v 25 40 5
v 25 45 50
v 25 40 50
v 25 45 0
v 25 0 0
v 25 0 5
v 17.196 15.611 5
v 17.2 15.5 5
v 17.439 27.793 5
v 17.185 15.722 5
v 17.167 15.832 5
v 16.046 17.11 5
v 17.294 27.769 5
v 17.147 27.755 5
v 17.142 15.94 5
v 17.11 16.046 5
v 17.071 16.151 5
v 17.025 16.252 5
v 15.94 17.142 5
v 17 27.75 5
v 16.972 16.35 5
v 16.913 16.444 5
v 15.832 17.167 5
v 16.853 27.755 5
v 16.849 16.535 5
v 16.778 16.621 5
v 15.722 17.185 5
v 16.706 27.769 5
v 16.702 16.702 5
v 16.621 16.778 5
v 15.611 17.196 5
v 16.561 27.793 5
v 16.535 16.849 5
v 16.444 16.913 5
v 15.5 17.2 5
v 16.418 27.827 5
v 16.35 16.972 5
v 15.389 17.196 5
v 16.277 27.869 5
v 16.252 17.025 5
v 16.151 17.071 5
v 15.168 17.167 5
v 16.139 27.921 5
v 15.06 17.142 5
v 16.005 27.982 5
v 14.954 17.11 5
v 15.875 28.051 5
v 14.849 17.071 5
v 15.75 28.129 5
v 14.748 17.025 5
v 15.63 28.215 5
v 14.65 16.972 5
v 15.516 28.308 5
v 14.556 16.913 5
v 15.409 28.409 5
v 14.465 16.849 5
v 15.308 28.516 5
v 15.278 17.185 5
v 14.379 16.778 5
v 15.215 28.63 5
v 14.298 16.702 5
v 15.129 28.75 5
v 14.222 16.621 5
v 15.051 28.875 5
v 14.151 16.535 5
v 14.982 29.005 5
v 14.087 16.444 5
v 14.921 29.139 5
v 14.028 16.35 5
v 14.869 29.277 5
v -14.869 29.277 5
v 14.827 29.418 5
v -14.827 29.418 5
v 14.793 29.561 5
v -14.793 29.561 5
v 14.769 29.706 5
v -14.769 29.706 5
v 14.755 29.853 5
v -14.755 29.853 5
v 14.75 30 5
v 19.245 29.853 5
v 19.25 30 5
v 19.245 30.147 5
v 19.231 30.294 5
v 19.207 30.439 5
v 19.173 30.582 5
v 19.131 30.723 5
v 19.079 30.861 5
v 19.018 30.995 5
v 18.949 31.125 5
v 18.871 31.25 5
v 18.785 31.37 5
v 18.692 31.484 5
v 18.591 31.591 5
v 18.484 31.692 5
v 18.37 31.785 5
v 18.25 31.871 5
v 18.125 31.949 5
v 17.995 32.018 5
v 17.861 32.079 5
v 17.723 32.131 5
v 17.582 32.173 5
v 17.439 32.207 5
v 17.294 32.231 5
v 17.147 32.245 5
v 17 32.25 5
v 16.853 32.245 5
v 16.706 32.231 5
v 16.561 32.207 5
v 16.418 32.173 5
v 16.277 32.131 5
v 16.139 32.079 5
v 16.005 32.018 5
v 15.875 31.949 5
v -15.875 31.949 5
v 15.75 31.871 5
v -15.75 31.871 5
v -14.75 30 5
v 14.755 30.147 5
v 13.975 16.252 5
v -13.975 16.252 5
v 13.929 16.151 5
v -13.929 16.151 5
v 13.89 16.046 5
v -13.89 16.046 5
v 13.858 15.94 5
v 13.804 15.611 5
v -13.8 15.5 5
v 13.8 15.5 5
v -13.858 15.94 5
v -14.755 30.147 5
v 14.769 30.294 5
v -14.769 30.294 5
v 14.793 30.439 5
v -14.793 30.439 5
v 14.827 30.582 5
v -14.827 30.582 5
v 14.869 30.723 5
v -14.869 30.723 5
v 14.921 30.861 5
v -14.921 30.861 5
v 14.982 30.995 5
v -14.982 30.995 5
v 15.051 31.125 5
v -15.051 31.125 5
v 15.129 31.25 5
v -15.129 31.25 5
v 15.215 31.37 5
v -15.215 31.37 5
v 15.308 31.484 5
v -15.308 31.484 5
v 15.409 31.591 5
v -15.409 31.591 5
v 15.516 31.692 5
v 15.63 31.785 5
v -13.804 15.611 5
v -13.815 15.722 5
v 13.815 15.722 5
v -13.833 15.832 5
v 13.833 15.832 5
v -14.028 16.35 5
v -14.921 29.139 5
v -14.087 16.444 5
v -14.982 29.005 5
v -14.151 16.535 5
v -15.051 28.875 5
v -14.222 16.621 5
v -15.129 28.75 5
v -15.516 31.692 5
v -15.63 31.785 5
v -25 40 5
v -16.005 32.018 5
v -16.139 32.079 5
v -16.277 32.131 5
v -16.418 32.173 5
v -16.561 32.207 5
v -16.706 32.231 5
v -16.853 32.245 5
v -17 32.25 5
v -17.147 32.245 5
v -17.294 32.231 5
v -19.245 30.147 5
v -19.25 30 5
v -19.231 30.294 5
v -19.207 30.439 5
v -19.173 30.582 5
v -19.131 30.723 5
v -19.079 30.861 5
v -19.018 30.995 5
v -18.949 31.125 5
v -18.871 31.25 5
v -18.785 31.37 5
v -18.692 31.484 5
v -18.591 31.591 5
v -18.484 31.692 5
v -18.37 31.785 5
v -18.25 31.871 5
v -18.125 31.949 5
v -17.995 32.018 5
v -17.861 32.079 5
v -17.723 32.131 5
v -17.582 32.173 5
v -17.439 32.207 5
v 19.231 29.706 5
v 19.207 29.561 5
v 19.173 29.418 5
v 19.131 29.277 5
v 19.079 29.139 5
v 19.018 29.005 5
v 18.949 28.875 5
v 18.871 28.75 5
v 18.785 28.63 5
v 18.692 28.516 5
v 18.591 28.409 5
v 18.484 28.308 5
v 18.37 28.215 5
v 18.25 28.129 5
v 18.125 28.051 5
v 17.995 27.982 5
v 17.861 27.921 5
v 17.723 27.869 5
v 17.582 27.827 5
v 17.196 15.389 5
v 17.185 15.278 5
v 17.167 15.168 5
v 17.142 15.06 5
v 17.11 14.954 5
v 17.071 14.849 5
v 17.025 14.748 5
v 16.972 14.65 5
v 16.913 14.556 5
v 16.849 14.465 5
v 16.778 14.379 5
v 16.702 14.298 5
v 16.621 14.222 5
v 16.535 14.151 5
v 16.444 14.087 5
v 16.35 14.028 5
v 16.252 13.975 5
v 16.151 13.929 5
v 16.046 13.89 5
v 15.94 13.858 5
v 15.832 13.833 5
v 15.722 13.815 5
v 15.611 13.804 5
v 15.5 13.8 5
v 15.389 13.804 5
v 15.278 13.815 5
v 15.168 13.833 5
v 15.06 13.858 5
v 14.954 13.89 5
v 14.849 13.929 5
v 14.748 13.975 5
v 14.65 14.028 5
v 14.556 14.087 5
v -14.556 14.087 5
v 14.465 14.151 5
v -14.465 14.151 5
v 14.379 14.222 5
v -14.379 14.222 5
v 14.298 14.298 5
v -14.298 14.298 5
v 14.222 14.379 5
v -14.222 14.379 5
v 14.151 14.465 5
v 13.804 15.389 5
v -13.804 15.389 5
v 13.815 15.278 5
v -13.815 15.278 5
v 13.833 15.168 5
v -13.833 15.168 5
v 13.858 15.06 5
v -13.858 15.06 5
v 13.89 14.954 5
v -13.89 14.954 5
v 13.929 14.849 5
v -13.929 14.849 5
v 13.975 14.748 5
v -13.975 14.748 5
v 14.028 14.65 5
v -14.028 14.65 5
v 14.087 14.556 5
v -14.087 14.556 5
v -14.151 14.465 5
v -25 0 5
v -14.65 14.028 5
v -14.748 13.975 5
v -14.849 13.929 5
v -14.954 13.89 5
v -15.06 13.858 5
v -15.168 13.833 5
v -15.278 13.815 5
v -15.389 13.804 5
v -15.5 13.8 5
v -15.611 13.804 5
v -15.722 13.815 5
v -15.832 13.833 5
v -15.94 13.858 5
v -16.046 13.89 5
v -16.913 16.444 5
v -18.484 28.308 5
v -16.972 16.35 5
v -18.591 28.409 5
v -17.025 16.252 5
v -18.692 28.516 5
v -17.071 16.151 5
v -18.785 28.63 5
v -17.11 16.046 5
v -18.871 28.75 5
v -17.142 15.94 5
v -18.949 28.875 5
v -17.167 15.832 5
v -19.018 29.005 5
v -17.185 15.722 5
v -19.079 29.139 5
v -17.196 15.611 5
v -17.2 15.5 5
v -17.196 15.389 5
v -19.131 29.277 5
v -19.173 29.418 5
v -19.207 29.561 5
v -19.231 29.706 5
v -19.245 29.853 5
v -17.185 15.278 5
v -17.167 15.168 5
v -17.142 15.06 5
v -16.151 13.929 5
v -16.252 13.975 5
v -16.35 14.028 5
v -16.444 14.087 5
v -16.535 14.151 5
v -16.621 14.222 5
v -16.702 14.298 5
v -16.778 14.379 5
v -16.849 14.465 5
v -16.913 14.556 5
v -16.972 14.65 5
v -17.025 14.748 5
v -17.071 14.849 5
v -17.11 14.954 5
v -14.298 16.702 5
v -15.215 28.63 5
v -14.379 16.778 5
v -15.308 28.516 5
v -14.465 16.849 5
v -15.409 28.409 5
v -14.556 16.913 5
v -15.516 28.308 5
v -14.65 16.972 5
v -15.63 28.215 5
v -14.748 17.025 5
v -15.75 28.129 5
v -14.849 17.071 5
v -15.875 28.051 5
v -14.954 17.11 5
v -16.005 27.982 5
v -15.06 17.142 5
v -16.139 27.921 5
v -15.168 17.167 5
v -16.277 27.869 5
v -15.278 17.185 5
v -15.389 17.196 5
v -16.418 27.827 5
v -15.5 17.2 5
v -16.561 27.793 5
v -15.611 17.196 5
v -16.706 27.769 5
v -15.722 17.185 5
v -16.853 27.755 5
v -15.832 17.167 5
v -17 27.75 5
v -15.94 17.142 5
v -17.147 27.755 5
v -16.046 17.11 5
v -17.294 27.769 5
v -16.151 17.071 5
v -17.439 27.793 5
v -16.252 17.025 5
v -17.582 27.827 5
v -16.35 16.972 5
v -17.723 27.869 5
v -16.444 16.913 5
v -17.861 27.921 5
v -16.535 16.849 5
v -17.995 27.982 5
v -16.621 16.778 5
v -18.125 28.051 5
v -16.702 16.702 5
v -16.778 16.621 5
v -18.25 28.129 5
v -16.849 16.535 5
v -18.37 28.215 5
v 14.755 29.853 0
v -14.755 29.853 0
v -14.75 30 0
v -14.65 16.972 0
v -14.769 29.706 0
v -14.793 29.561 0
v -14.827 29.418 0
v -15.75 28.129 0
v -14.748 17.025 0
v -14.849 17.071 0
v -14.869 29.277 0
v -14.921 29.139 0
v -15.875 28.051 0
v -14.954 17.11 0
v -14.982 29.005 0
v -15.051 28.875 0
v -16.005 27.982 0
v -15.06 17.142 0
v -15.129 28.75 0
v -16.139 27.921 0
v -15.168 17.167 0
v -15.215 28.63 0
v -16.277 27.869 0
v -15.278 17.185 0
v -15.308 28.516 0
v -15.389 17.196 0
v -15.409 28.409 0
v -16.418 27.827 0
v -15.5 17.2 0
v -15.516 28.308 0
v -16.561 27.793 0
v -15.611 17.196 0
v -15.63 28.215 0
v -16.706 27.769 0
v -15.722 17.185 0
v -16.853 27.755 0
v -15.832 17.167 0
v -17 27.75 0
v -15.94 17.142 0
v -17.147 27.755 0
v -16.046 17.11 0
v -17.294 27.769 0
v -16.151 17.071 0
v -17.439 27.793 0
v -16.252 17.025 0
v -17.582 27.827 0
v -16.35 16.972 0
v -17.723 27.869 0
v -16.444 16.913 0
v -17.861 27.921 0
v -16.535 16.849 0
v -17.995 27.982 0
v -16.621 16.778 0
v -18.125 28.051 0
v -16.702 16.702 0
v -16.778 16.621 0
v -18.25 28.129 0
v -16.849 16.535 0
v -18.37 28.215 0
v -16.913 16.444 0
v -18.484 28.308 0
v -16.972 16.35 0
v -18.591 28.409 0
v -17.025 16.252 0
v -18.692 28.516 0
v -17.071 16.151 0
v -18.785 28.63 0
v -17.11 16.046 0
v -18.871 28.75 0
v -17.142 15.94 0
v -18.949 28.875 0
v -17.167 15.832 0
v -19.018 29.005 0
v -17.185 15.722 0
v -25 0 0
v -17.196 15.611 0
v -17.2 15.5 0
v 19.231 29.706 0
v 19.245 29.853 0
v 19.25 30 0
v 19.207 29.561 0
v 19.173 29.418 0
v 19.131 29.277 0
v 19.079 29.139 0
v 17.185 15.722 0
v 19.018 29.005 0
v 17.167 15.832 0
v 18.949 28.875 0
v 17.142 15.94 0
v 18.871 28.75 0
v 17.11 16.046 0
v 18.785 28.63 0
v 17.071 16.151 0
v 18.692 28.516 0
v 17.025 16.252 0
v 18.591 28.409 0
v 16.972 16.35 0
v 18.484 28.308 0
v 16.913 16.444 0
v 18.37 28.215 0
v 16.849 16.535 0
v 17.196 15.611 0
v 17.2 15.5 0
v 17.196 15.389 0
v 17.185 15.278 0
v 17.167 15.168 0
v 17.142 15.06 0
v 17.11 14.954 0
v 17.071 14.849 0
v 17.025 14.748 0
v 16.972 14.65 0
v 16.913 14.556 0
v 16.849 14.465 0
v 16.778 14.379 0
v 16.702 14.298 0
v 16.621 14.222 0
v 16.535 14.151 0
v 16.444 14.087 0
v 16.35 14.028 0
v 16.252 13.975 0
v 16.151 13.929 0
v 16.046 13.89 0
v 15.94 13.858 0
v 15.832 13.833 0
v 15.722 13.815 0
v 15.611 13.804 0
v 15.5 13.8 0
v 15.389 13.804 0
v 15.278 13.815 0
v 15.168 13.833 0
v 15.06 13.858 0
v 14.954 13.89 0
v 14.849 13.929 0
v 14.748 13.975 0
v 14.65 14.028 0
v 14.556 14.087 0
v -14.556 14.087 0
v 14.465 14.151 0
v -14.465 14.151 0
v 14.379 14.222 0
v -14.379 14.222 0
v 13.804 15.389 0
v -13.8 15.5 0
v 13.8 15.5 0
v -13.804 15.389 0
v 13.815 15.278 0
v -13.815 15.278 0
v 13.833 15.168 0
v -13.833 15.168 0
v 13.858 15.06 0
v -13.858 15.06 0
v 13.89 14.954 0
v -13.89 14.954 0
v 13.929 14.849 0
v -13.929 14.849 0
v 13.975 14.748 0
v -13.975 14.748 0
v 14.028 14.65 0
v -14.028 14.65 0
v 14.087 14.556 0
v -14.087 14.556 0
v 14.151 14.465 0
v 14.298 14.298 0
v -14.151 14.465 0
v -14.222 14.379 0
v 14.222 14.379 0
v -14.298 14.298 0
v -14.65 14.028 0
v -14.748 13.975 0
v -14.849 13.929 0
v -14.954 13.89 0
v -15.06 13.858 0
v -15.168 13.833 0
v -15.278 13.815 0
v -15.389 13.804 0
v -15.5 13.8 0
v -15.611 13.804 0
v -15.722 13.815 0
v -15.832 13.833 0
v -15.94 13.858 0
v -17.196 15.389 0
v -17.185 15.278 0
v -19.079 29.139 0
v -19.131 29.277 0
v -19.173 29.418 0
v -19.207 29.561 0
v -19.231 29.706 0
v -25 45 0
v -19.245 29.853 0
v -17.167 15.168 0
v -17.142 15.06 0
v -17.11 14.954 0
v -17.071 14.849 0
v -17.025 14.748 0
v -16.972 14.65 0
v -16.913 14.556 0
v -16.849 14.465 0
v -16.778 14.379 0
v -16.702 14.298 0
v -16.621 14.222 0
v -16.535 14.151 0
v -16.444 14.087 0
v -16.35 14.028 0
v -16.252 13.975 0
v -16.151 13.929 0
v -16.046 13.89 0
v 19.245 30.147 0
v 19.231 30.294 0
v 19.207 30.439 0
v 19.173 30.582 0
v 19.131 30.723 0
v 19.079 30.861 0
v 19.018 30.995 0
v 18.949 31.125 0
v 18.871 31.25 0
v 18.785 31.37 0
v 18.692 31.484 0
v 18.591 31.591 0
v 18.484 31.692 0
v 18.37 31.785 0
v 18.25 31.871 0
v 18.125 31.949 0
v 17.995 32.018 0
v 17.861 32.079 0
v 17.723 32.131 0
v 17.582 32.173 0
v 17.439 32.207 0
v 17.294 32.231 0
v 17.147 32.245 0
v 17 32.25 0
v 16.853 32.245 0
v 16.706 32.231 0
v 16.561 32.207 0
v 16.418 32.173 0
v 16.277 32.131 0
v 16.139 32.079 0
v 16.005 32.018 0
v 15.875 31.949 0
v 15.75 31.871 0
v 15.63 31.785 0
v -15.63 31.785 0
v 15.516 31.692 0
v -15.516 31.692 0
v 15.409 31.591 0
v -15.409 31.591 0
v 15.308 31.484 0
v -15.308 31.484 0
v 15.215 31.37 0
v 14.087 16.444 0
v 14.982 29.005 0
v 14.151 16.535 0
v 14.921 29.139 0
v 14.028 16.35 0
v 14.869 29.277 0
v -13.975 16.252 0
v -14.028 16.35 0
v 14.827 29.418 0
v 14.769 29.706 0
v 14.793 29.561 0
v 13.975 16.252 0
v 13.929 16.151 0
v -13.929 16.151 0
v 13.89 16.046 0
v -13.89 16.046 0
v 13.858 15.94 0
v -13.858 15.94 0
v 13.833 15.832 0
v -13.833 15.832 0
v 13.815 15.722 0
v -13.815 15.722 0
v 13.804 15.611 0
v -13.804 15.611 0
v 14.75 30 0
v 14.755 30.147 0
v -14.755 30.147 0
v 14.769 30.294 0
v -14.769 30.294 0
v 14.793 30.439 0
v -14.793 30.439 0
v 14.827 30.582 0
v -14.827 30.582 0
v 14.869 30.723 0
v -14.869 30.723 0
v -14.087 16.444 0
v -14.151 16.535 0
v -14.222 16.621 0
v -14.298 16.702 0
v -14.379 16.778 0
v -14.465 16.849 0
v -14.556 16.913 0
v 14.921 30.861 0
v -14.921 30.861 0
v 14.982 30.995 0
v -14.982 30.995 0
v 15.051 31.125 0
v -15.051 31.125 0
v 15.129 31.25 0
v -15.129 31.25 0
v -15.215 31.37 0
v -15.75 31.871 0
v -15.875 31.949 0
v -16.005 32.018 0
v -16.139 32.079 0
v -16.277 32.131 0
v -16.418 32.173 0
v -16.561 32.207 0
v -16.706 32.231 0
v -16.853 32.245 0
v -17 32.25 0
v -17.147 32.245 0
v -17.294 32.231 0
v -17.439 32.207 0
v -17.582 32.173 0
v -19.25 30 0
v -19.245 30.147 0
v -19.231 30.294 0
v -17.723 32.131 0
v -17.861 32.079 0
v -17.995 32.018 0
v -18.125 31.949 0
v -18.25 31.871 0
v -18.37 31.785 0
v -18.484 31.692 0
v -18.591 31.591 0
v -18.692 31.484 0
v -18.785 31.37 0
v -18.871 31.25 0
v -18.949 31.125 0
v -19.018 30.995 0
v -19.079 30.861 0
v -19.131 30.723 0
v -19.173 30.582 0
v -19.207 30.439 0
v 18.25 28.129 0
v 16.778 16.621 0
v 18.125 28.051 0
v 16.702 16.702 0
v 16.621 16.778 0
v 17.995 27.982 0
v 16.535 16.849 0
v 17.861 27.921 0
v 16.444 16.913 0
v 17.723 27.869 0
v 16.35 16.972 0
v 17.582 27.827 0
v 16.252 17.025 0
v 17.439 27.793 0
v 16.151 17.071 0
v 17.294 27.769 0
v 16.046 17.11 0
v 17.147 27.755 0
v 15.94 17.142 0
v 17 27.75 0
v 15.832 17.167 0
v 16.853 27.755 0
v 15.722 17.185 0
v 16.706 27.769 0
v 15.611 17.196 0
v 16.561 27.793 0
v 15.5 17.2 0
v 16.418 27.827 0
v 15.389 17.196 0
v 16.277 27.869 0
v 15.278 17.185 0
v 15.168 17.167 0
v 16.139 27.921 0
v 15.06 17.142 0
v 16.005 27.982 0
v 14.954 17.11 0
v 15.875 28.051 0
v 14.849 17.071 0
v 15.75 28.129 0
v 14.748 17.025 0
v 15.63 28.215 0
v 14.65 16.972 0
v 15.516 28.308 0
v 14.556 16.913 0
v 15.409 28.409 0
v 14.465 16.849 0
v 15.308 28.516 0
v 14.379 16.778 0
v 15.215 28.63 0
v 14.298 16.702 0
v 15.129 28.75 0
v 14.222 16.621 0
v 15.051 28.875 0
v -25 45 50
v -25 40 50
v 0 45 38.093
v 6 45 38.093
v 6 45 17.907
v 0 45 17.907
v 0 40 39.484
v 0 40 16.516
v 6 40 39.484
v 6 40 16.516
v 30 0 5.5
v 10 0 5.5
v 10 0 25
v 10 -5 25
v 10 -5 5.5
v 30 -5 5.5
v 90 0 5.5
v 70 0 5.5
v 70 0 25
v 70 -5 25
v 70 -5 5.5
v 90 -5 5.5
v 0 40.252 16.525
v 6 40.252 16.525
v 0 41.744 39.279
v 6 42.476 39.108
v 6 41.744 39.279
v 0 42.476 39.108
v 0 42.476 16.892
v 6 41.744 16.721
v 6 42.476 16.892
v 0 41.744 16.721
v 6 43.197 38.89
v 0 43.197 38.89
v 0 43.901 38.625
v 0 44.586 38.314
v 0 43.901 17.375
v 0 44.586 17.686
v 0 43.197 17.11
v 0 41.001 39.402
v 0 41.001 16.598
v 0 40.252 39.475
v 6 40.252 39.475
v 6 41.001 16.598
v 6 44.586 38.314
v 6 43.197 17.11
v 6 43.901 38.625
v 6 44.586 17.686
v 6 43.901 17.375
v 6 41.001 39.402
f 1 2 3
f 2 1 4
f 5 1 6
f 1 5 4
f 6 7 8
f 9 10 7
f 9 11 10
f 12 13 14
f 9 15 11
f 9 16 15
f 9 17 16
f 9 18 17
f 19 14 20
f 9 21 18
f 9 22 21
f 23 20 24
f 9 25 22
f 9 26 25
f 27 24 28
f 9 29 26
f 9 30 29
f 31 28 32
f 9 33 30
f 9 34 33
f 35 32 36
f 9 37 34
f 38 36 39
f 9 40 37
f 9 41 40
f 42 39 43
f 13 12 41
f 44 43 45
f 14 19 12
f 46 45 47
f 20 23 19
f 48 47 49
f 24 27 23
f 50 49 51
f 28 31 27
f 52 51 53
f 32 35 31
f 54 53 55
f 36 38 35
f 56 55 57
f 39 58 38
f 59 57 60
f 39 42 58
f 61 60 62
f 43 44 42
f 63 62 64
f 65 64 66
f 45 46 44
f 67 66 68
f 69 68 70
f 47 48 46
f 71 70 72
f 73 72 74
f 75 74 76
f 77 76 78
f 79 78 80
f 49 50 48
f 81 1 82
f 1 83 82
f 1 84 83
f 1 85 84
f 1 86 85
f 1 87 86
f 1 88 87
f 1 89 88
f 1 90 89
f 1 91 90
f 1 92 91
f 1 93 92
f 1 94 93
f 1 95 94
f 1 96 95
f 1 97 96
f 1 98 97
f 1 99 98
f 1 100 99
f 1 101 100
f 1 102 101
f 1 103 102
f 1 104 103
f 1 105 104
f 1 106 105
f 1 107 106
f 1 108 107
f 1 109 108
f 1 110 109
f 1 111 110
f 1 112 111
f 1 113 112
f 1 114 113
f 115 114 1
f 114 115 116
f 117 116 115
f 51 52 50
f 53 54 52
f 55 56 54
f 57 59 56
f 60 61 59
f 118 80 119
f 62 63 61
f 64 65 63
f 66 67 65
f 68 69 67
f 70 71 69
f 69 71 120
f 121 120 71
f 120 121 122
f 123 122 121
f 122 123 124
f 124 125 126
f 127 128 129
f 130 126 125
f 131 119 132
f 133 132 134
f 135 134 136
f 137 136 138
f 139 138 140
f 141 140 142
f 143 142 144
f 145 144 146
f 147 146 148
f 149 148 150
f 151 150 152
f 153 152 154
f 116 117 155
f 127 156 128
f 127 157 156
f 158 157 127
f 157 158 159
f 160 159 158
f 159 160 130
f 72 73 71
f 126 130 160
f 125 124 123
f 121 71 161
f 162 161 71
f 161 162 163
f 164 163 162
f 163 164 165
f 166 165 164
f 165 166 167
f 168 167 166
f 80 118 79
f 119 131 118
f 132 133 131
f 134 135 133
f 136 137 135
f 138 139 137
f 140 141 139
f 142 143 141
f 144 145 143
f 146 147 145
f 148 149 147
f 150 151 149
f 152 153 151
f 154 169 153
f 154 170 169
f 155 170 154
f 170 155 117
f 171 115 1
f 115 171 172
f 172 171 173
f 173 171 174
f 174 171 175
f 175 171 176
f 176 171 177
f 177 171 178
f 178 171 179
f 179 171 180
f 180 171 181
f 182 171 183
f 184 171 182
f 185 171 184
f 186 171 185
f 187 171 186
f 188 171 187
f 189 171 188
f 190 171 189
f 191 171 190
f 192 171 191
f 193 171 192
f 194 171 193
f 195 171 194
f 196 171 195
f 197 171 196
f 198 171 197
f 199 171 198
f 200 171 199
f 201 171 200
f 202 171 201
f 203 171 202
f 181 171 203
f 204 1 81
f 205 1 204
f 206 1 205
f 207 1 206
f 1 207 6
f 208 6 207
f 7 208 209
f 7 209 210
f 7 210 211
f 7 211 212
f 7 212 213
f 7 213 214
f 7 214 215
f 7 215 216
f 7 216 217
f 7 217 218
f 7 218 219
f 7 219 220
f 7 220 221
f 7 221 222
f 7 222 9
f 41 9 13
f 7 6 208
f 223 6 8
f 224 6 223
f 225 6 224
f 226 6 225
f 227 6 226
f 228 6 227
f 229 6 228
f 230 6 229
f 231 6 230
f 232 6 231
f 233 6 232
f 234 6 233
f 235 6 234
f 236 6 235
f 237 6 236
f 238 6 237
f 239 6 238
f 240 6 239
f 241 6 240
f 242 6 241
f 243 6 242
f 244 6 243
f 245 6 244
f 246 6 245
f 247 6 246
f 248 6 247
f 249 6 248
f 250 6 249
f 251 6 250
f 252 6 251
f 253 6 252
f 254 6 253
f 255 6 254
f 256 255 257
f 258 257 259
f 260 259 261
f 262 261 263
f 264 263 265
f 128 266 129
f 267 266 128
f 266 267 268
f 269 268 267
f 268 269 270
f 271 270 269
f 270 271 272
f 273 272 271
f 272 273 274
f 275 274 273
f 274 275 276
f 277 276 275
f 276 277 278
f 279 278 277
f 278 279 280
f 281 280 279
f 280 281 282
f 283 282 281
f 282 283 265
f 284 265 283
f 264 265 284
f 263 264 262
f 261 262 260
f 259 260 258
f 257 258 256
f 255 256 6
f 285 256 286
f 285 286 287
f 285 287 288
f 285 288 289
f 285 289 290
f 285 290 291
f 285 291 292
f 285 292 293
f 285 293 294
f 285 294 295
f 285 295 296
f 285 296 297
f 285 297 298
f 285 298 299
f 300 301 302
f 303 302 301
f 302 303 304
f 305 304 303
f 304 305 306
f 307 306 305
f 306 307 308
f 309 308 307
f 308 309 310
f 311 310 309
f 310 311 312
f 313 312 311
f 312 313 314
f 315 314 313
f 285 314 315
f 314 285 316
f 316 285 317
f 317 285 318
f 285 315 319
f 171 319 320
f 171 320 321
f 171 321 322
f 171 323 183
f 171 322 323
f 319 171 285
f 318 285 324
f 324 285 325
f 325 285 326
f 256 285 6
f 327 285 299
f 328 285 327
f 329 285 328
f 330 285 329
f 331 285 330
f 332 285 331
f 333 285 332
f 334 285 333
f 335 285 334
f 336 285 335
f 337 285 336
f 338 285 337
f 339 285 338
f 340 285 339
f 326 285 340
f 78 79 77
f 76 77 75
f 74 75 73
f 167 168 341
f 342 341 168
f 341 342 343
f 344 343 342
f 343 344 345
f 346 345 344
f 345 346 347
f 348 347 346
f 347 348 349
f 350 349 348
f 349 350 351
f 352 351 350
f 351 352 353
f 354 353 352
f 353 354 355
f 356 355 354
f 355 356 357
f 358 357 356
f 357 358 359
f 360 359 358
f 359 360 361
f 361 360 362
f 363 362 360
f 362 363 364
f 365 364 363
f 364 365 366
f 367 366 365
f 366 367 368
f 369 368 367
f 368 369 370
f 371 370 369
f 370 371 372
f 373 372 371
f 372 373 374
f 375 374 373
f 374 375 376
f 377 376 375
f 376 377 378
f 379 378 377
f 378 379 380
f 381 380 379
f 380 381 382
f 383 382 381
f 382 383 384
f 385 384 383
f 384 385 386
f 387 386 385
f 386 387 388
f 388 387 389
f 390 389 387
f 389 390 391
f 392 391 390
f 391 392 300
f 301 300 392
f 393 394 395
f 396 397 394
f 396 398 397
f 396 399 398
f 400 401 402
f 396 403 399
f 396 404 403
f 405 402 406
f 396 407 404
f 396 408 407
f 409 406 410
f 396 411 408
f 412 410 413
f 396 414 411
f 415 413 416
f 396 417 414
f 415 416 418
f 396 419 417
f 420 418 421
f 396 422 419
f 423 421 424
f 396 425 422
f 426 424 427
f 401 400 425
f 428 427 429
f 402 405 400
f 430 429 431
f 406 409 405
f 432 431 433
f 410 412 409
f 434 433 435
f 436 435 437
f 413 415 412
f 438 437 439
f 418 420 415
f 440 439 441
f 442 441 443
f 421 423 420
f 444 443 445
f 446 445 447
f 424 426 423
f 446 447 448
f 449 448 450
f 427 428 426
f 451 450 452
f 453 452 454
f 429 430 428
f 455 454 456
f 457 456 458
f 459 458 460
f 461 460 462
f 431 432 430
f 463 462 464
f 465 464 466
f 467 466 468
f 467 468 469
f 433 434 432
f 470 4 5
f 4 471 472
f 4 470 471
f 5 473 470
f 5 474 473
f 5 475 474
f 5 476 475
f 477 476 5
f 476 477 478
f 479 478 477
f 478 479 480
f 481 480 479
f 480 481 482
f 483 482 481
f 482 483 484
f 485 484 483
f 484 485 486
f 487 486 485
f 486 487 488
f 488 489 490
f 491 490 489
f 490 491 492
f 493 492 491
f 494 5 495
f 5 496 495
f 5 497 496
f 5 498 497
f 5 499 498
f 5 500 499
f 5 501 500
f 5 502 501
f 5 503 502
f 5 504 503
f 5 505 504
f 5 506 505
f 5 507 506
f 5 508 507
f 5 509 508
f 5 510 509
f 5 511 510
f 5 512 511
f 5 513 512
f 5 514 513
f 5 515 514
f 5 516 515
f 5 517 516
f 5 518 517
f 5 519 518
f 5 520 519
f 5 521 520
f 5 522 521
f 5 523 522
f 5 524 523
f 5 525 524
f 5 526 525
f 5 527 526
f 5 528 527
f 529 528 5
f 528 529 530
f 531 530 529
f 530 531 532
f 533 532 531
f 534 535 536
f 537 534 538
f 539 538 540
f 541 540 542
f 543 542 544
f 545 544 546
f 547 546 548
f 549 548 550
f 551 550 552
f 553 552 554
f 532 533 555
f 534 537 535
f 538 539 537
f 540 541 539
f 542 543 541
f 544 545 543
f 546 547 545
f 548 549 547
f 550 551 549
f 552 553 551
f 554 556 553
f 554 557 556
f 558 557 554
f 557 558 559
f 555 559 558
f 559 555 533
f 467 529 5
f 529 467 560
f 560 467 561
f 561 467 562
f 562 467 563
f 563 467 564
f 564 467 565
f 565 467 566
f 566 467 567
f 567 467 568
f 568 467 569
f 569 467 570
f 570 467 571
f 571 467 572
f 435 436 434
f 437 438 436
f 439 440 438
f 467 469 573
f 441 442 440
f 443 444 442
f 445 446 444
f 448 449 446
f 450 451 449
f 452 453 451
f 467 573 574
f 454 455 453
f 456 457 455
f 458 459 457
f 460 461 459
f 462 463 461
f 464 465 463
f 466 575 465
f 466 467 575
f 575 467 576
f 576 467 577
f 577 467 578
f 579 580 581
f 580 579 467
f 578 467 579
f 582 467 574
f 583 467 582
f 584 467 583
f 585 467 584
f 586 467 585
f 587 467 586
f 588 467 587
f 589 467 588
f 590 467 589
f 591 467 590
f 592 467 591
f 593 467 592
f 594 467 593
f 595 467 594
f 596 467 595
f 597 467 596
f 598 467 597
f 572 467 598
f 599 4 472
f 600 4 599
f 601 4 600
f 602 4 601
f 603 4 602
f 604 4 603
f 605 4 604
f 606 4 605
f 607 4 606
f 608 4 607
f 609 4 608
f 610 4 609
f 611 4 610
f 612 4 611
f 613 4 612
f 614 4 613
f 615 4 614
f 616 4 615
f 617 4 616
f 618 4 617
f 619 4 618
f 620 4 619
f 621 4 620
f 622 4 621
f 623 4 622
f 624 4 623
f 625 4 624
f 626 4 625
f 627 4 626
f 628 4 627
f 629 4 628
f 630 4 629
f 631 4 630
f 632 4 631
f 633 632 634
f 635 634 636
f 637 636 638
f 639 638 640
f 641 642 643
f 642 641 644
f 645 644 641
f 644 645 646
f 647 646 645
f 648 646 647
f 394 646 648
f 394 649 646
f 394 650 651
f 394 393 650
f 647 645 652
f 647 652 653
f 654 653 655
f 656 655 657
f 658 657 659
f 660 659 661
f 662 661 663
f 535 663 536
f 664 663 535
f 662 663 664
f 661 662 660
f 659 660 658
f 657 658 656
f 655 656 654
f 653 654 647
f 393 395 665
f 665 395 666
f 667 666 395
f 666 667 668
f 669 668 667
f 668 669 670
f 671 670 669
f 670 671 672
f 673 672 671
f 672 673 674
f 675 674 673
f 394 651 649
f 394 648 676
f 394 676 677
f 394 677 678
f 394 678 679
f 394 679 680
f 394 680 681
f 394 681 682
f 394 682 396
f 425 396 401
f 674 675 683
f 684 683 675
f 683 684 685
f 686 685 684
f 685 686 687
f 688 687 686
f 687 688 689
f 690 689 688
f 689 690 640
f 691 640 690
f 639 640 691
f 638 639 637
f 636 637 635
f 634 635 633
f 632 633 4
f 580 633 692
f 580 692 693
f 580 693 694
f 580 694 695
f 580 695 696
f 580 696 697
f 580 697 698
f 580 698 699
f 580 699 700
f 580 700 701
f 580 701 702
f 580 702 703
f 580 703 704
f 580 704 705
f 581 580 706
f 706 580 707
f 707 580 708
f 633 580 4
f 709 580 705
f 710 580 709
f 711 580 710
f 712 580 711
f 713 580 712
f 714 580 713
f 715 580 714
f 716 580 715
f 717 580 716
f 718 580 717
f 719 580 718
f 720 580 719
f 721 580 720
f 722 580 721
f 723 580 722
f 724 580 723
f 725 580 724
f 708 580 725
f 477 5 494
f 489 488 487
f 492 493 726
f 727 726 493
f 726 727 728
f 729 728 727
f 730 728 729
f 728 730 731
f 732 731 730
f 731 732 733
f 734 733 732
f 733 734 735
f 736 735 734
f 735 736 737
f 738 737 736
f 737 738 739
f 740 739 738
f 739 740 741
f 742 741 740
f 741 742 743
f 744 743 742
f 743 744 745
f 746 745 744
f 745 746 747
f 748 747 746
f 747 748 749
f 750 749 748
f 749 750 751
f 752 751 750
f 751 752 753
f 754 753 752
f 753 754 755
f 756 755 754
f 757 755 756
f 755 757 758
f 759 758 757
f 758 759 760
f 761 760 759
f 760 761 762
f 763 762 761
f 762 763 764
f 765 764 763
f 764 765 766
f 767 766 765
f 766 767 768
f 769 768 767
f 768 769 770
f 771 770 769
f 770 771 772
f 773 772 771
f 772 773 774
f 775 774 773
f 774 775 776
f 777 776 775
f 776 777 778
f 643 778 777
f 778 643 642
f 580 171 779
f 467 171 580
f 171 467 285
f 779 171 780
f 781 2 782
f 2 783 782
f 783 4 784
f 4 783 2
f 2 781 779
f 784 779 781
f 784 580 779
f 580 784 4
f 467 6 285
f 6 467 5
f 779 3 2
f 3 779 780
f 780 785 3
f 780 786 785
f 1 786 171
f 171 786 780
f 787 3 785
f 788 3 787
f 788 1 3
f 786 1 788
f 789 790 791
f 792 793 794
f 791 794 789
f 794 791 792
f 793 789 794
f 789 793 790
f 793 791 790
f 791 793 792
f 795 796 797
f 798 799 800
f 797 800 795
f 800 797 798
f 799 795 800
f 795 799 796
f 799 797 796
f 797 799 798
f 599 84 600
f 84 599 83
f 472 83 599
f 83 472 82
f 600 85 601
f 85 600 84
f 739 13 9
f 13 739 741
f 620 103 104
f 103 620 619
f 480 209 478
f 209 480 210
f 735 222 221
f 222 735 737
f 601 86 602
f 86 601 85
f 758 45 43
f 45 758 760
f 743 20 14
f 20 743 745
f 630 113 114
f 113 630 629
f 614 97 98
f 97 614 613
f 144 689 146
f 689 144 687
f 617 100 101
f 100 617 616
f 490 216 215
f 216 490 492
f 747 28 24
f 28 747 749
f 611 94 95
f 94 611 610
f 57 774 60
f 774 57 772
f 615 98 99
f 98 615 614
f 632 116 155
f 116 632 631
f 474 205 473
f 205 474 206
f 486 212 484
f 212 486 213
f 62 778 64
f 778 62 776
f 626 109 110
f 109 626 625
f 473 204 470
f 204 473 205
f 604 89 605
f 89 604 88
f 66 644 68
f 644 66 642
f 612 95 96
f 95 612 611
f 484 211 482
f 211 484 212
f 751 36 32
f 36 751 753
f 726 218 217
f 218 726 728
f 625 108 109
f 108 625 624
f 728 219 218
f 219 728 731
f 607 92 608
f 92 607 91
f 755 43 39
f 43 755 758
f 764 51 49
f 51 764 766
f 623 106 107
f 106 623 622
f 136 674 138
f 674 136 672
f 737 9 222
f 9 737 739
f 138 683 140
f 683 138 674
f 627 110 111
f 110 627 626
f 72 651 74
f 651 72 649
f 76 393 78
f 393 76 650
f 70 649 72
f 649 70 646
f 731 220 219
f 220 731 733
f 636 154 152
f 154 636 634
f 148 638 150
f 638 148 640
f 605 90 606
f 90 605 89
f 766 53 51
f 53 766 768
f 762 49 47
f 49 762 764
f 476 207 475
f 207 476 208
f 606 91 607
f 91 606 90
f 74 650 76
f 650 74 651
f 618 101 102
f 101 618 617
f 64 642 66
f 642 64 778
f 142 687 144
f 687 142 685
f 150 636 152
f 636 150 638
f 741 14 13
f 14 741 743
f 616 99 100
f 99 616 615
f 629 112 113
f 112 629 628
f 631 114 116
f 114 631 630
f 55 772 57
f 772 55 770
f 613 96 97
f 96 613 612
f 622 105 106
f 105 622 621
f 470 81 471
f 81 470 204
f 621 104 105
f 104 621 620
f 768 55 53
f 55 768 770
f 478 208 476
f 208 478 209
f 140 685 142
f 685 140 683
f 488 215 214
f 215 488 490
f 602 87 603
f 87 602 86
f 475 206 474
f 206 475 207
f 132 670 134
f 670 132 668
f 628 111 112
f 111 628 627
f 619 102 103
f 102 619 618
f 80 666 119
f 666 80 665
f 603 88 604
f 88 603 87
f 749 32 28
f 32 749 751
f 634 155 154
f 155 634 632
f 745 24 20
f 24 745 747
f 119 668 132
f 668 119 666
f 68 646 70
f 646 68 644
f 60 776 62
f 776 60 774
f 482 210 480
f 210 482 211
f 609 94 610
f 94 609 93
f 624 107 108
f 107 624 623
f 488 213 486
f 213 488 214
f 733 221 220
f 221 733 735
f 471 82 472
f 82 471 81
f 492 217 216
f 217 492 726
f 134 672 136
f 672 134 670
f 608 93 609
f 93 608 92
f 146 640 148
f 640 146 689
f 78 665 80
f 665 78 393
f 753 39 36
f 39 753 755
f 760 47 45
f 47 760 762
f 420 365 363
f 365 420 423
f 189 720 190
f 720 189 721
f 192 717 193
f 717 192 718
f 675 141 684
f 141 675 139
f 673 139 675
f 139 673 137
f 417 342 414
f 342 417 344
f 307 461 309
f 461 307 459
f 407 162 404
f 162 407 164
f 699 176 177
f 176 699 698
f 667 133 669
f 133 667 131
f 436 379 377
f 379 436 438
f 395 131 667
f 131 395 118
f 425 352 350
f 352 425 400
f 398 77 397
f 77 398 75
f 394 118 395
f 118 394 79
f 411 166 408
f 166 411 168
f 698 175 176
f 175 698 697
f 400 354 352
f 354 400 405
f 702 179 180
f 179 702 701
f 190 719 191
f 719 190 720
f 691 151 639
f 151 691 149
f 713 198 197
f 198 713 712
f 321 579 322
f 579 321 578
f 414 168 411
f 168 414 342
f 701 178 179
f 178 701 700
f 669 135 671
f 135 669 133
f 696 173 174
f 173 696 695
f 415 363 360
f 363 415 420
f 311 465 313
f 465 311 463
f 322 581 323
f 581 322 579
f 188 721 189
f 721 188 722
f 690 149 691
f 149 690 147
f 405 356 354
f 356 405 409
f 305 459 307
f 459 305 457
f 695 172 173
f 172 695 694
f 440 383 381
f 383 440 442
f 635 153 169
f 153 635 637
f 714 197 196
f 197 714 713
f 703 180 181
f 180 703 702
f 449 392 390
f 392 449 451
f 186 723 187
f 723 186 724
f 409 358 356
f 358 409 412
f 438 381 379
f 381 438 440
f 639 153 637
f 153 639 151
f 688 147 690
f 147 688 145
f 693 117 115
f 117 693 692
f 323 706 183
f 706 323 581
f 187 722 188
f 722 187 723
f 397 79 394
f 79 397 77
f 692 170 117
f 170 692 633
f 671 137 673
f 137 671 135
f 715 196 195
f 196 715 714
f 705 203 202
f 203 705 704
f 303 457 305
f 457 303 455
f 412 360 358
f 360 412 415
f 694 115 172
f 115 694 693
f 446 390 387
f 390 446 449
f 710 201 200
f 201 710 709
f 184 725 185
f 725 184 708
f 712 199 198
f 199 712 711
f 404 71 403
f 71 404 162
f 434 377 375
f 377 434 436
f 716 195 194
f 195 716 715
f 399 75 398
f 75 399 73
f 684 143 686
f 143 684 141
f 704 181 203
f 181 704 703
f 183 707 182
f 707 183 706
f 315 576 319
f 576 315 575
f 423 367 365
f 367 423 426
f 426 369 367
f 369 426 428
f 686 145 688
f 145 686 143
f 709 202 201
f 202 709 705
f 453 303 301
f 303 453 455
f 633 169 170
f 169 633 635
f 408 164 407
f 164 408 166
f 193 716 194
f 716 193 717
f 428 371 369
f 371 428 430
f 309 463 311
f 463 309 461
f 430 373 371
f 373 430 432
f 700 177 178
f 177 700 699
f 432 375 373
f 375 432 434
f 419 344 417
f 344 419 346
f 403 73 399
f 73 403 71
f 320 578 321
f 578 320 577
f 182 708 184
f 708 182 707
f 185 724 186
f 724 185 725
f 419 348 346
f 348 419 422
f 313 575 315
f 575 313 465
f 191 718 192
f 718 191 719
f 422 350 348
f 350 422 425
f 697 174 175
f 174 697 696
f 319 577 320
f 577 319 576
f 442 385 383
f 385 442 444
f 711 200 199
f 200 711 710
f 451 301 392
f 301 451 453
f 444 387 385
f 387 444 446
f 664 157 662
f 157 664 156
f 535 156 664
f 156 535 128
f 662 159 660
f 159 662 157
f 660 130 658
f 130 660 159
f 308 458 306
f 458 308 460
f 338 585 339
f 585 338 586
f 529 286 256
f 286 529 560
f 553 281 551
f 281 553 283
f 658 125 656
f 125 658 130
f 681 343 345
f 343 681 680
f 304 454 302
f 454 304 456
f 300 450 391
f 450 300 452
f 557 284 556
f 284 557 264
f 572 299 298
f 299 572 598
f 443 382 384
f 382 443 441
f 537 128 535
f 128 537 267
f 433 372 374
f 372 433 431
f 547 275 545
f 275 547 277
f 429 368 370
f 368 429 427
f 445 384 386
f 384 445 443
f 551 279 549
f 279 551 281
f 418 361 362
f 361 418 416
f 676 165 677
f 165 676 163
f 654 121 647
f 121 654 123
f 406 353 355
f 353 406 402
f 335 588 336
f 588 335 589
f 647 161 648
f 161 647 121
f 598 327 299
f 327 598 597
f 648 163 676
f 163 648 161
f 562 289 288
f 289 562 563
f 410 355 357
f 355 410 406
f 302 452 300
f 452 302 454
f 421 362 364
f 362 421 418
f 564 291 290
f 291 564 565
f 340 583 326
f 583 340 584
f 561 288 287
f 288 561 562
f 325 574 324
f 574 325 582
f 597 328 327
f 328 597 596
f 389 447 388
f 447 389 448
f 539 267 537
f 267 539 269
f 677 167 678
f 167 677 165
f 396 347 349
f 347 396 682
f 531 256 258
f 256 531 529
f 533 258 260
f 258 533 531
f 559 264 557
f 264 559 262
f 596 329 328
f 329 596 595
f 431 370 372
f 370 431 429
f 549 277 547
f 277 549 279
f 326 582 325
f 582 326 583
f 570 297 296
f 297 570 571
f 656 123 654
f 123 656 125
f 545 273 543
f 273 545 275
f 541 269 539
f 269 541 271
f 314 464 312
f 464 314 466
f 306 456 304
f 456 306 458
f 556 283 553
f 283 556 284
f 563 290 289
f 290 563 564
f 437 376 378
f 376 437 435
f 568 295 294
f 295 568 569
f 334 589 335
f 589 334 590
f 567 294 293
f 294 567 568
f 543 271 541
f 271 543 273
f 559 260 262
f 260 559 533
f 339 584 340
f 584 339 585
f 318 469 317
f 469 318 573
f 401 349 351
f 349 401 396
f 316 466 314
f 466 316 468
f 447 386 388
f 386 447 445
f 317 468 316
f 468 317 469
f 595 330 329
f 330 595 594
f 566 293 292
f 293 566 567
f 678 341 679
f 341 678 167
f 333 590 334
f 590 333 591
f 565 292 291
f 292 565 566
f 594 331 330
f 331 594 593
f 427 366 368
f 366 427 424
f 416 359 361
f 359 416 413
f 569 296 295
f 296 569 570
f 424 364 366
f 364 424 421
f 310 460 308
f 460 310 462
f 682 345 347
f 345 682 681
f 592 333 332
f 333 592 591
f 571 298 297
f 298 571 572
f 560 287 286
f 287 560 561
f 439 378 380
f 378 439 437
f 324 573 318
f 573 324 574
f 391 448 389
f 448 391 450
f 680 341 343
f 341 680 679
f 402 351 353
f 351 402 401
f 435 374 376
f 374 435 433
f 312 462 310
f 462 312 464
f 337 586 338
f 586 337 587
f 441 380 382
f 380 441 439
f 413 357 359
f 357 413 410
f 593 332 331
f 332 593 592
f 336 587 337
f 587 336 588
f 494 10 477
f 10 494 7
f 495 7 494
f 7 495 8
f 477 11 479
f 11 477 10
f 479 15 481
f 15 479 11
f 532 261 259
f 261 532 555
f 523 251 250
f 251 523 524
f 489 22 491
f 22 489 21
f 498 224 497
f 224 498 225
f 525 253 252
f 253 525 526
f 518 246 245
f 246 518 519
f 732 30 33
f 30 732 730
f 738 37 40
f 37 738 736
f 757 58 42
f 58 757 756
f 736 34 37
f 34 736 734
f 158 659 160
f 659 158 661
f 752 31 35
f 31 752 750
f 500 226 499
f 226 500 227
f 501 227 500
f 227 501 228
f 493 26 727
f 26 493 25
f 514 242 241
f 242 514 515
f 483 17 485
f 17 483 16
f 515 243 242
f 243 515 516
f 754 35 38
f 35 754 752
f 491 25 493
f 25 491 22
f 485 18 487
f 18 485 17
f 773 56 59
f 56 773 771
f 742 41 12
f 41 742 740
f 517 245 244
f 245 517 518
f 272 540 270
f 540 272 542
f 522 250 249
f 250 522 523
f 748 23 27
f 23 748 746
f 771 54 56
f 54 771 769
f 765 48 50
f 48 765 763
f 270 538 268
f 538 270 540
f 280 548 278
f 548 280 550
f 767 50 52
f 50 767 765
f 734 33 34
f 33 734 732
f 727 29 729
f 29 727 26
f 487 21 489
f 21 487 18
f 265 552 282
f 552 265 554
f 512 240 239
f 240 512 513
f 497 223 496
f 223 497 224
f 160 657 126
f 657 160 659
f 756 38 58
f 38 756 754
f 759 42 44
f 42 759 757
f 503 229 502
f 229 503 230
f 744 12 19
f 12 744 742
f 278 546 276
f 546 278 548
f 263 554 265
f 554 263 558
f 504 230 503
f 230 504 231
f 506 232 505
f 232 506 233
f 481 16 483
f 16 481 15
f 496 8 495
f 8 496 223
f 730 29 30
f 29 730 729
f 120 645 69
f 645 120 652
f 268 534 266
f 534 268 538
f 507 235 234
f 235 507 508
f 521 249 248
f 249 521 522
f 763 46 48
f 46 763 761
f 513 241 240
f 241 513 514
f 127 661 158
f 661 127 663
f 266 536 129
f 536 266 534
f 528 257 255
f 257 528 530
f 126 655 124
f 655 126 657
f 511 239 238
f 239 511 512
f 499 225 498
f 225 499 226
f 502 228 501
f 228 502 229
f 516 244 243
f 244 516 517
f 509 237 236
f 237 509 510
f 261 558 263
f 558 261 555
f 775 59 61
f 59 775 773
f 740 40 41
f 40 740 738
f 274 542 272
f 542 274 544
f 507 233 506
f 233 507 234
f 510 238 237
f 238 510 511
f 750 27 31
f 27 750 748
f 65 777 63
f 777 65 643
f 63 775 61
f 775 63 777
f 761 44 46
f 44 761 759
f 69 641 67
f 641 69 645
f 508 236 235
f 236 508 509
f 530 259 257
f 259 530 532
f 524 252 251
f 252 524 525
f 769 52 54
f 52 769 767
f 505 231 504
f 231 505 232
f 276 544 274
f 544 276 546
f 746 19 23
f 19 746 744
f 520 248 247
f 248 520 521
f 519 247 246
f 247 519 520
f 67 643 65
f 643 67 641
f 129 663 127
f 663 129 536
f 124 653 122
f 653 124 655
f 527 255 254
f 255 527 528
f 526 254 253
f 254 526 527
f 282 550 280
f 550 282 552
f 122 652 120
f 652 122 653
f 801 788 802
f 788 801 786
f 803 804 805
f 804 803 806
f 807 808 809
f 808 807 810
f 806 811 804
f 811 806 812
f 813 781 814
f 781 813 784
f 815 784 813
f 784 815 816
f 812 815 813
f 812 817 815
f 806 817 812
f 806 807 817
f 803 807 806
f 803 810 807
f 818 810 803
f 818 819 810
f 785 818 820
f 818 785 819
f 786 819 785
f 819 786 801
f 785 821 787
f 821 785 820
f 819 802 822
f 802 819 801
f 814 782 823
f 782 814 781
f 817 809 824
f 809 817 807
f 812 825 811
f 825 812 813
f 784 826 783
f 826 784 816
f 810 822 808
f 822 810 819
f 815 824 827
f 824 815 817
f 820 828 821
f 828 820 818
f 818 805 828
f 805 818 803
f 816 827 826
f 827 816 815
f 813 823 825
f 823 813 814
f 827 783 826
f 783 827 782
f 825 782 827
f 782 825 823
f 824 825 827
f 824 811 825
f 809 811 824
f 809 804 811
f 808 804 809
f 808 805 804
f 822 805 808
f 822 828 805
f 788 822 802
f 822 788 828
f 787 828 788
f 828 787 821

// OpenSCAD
// L-shaped mounting bracket for NEMA 17 stepper motor
// Print orientation: base plate on bed, motor plate builds upward (+Z)

// ---------------- Parameters ----------------
plate_x       = 25;    // base plate half-width (X)
plate_y       = 45;    // base plate length (Y)
plate_t       = 5;     // base plate thickness (Z)

motor_h       = 50;    // motor plate height (Z)
motor_w       = 5;     // motor plate thickness (Y)

boss_d        = 23;    // motor boss hole diameter
boss_x        = 0;     // boss hole centre X
boss_z        = 28;    // boss hole centre Z

screw_d       = 3.4;   // M3 screw hole diameter
screw_pitch   = 31;    // square pattern side length

gusset_t      = 5;     // gusset thickness (X)
gusset_leg    = 20;    // right-triangle leg length (Y and Z)

eps           = 0.5;   // cutter overshoot past faces
$fn           = 96;    // curve resolution

// ---------------- Model ----------------
difference() {
    union() {
        // Base plate
        translate([-plate_x, 0, 0])
            cube([plate_x * 2, plate_y, plate_t]);

        // Motor plate (standing on back edge of base)
        translate([-plate_x, plate_y - motor_w, 0])
            cube([plate_x * 2, motor_w, motor_h]);

        // Left gusset: right triangle in YZ, flush with left edge
        translate([-plate_x - gusset_t, 0, 0])
            rotate([90, 0, 0])
                linear_extrude(height = gusset_t)
                    polygon(points = [
                        [plate_y - motor_w, plate_t + eps],   // right-angle corner
                        [plate_y - motor_w + gusset_leg, plate_t + eps],
                        [plate_y - motor_w, plate_t + gusset_leg]
                    ]);

        // Right gusset: right triangle in YZ, flush with right edge
        translate([plate_x + gusset_t, 0, 0])
            rotate([90, 0, 0])
                linear_extrude(height = gusset_t)
                    polygon(points = [
                        [plate_y - motor_w, plate_t + eps],
                        [plate_y - motor_w, plate_t + gusset_leg],
                        [plate_y - motor_w + gusset_leg, plate_t + eps]
                    ]);
    }

    // Base plate through-holes (M4)
    for (h = [-1, 1])
        translate([-17 * h, 30, -eps])
            cylinder(d = 4.5, h = plate_t + 2 * eps);

    // Motor boss hole (along Y)
    translate([boss_x, plate_y - motor_w - eps, boss_z])
        rotate([0, 90, 0])
            cylinder(d = boss_d, h = motor_w + 2 * eps);

    // M3 screw holes on square pattern, centred on boss hole
    for (a = [-1, 1])
        for (b = [-1, 1])
            translate([a * screw_pitch / 2, b * screw_pitch / 2, -eps])
                cylinder(d = screw_d, h = motor_h + 2 * eps);
}
